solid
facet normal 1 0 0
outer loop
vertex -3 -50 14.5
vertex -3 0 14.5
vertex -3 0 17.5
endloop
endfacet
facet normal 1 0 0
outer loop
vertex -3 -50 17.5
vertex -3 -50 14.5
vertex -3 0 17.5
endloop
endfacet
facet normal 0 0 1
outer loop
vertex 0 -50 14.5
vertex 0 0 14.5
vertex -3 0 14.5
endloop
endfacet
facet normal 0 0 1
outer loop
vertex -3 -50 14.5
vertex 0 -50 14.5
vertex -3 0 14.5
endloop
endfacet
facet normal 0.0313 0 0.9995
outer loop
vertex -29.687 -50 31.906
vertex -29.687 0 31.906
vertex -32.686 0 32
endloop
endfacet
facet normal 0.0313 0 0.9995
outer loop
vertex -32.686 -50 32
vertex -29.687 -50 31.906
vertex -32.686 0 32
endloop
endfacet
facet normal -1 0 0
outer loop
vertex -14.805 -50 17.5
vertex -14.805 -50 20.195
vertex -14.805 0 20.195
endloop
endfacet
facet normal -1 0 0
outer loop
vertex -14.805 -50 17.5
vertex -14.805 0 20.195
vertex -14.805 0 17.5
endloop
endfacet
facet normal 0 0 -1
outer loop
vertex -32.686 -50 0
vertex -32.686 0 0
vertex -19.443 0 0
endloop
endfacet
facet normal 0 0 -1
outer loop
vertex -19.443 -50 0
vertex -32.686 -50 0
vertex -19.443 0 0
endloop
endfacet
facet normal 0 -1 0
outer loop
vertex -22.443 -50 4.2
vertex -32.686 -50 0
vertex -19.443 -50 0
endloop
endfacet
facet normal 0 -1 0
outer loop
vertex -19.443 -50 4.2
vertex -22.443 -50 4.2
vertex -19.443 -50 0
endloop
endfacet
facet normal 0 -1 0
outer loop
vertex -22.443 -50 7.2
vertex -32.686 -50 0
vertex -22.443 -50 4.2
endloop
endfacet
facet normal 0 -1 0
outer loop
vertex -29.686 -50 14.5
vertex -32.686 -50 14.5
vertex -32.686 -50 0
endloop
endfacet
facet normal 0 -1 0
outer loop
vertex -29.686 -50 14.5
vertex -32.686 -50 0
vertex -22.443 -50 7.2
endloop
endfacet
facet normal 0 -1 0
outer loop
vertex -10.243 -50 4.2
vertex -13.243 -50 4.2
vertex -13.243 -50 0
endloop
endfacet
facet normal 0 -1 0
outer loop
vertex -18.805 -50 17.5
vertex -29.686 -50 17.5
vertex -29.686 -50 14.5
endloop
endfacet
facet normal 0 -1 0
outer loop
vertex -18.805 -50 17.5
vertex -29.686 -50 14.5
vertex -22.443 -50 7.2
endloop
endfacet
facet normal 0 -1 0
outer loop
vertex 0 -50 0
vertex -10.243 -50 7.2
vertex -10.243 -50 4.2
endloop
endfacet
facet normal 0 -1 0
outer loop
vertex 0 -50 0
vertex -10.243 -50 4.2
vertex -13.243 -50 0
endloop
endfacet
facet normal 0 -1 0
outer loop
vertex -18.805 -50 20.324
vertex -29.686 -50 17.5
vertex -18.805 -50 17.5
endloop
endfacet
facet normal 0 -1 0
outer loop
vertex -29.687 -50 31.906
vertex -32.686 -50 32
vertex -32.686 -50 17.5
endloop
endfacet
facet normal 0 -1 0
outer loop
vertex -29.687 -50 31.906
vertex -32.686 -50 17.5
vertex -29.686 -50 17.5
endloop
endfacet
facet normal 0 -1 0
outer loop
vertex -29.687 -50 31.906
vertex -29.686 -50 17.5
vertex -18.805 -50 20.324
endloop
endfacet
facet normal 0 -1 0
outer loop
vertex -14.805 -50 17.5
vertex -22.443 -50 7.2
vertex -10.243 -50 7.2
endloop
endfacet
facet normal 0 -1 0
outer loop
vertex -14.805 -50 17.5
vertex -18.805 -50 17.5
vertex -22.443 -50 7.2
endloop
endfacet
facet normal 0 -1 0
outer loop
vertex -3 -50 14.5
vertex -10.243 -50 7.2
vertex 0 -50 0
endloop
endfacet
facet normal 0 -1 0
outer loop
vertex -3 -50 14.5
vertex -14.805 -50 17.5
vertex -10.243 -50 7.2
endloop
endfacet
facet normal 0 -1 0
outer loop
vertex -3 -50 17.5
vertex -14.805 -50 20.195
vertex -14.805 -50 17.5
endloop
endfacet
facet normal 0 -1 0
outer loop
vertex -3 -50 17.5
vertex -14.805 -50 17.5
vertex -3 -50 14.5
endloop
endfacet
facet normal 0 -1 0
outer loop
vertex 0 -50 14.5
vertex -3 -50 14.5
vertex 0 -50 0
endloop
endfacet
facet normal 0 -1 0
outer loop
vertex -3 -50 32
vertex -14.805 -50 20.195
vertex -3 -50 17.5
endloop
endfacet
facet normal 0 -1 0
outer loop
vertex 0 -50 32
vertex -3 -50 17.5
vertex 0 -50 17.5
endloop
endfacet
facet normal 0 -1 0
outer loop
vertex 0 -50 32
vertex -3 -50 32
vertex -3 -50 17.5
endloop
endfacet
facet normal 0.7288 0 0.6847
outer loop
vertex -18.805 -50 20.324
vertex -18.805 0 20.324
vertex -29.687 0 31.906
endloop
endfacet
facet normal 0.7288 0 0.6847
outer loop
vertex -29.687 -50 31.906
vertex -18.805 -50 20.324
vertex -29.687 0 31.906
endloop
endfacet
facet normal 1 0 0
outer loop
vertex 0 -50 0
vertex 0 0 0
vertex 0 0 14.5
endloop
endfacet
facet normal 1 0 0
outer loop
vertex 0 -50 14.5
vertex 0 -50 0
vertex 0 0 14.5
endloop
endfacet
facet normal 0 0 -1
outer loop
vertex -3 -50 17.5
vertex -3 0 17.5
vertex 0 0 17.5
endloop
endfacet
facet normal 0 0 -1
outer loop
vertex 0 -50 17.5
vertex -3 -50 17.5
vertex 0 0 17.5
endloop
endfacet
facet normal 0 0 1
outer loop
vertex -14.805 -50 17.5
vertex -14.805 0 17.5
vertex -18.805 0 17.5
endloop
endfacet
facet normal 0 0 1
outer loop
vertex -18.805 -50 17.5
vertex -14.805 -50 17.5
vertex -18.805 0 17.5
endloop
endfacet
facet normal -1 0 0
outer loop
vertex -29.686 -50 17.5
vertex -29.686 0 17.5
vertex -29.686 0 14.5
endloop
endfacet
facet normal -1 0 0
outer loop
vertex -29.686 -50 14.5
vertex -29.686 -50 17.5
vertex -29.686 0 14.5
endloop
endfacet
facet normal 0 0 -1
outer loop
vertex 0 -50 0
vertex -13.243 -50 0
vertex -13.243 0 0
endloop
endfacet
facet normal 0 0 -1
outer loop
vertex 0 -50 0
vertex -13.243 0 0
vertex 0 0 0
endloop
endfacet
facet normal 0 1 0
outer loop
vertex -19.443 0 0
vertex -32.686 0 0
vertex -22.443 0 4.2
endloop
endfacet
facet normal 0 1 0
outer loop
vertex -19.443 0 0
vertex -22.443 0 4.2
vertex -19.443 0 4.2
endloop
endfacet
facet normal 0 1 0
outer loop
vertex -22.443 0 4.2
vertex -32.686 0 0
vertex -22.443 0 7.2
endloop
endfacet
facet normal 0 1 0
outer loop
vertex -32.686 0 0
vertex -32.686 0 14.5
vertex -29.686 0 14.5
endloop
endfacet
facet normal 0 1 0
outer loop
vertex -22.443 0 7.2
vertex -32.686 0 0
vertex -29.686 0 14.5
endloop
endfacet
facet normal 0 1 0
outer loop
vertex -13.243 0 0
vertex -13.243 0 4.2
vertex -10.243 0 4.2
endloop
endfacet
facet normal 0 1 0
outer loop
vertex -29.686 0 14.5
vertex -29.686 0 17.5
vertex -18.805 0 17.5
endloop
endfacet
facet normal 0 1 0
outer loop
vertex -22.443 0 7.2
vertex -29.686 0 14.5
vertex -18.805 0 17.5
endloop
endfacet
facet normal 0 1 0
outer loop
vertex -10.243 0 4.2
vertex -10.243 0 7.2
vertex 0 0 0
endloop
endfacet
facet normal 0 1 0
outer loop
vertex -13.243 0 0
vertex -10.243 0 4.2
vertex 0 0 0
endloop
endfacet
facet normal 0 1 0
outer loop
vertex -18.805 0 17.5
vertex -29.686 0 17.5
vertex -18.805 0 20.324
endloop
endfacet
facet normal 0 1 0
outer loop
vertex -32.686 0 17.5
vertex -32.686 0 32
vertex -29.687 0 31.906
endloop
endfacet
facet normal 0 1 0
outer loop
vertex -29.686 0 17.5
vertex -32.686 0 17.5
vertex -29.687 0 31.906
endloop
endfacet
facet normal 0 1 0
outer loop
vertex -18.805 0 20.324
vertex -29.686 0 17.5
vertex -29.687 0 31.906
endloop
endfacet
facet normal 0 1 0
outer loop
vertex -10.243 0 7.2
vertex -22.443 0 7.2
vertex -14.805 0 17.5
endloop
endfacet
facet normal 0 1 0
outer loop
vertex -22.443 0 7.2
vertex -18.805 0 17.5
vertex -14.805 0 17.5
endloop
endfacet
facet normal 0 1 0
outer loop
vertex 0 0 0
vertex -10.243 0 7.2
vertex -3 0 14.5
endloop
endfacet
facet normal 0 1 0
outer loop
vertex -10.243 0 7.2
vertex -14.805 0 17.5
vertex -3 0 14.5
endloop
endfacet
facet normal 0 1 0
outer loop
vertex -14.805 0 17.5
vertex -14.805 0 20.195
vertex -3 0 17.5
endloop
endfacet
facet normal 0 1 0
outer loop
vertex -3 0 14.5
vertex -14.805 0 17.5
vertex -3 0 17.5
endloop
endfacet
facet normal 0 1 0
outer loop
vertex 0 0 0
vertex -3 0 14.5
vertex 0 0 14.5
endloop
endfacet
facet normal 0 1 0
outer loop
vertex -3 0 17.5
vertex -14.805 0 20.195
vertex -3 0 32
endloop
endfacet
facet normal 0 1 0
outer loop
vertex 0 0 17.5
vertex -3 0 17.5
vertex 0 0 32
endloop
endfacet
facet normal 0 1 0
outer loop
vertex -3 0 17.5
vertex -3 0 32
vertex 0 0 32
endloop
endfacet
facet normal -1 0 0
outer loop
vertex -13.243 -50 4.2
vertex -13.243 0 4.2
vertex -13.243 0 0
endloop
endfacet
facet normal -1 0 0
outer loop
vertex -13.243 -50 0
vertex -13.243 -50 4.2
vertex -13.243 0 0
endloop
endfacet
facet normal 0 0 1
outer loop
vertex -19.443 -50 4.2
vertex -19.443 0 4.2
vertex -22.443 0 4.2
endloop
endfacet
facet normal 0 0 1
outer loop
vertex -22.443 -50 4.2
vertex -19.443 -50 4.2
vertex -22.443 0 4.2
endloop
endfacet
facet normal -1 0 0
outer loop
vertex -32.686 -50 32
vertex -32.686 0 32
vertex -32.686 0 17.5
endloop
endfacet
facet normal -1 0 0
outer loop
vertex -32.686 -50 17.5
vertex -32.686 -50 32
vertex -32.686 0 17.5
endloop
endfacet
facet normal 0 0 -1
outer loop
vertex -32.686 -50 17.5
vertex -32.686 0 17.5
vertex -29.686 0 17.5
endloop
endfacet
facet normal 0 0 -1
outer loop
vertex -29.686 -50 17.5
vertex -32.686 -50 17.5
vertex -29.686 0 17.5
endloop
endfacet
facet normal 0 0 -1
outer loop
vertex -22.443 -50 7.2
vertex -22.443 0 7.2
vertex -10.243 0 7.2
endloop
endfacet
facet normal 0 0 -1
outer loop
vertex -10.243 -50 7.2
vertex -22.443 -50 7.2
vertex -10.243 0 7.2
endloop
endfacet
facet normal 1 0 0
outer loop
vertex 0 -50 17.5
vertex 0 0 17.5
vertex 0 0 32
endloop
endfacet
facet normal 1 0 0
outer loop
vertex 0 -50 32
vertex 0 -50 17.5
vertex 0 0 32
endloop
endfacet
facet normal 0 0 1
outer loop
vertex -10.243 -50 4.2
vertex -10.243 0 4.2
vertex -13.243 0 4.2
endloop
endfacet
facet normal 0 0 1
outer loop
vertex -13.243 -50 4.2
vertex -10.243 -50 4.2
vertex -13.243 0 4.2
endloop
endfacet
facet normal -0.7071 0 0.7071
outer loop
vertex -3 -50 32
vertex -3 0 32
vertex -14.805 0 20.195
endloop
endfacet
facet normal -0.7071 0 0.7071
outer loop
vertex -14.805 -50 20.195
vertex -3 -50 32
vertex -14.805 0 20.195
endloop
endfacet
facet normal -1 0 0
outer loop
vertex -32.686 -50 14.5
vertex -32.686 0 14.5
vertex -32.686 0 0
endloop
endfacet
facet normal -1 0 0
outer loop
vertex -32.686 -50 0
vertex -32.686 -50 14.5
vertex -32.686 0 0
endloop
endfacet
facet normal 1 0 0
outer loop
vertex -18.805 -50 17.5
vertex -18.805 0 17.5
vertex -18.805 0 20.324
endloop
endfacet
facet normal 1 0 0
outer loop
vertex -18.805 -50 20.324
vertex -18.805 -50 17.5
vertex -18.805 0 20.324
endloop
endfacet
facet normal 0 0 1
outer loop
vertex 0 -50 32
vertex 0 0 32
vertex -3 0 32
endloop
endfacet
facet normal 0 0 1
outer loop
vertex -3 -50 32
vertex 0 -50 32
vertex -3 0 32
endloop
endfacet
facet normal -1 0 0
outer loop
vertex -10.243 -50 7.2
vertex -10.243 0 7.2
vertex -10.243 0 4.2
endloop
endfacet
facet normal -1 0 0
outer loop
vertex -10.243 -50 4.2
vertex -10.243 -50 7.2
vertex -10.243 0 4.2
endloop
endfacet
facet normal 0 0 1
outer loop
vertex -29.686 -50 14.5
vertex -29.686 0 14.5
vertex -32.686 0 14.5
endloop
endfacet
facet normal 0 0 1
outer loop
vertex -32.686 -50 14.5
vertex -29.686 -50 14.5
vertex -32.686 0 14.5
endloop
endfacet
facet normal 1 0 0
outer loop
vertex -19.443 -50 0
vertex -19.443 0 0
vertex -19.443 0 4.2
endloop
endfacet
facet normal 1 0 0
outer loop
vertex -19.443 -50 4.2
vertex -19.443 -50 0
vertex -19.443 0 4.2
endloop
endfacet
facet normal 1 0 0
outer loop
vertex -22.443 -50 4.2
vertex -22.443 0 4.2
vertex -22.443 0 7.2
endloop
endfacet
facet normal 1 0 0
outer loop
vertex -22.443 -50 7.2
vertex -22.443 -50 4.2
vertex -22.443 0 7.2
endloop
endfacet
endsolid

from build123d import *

# Parameters (mm, degrees)
F1_DEPTH = 50


with BuildPart() as f1:
    # F0 (on Front) → F1 (new body)
    with BuildSketch(Plane.XZ):
        Polygon((-13.242977, 0), (0, 0), (0, 14.5), (-3, 14.5), (-3, 17.5), (0, 17.5), (0, 32), (-3, 32), (-14.805269, 20.194731), (-14.805269, 17.5), (-16.805269, 17.5), (-18.805269, 17.5), (-18.805269, 20.323527), (-29.687413, 31.906461), (-32.685954, 32), (-32.685954, 17.5), (-29.685954, 17.5), (-29.685954, 14.5), (-32.685954, 14.5), (-32.685954, 0), (-19.442977, 0), (-19.442977, 4.2), (-22.442977, 4.2), (-22.442977, 7.2), (-10.242977, 7.2), (-10.242977, 4.2), (-13.242977, 4.2), align=None)
    extrude(amount=F1_DEPTH)


solid = f1.part
